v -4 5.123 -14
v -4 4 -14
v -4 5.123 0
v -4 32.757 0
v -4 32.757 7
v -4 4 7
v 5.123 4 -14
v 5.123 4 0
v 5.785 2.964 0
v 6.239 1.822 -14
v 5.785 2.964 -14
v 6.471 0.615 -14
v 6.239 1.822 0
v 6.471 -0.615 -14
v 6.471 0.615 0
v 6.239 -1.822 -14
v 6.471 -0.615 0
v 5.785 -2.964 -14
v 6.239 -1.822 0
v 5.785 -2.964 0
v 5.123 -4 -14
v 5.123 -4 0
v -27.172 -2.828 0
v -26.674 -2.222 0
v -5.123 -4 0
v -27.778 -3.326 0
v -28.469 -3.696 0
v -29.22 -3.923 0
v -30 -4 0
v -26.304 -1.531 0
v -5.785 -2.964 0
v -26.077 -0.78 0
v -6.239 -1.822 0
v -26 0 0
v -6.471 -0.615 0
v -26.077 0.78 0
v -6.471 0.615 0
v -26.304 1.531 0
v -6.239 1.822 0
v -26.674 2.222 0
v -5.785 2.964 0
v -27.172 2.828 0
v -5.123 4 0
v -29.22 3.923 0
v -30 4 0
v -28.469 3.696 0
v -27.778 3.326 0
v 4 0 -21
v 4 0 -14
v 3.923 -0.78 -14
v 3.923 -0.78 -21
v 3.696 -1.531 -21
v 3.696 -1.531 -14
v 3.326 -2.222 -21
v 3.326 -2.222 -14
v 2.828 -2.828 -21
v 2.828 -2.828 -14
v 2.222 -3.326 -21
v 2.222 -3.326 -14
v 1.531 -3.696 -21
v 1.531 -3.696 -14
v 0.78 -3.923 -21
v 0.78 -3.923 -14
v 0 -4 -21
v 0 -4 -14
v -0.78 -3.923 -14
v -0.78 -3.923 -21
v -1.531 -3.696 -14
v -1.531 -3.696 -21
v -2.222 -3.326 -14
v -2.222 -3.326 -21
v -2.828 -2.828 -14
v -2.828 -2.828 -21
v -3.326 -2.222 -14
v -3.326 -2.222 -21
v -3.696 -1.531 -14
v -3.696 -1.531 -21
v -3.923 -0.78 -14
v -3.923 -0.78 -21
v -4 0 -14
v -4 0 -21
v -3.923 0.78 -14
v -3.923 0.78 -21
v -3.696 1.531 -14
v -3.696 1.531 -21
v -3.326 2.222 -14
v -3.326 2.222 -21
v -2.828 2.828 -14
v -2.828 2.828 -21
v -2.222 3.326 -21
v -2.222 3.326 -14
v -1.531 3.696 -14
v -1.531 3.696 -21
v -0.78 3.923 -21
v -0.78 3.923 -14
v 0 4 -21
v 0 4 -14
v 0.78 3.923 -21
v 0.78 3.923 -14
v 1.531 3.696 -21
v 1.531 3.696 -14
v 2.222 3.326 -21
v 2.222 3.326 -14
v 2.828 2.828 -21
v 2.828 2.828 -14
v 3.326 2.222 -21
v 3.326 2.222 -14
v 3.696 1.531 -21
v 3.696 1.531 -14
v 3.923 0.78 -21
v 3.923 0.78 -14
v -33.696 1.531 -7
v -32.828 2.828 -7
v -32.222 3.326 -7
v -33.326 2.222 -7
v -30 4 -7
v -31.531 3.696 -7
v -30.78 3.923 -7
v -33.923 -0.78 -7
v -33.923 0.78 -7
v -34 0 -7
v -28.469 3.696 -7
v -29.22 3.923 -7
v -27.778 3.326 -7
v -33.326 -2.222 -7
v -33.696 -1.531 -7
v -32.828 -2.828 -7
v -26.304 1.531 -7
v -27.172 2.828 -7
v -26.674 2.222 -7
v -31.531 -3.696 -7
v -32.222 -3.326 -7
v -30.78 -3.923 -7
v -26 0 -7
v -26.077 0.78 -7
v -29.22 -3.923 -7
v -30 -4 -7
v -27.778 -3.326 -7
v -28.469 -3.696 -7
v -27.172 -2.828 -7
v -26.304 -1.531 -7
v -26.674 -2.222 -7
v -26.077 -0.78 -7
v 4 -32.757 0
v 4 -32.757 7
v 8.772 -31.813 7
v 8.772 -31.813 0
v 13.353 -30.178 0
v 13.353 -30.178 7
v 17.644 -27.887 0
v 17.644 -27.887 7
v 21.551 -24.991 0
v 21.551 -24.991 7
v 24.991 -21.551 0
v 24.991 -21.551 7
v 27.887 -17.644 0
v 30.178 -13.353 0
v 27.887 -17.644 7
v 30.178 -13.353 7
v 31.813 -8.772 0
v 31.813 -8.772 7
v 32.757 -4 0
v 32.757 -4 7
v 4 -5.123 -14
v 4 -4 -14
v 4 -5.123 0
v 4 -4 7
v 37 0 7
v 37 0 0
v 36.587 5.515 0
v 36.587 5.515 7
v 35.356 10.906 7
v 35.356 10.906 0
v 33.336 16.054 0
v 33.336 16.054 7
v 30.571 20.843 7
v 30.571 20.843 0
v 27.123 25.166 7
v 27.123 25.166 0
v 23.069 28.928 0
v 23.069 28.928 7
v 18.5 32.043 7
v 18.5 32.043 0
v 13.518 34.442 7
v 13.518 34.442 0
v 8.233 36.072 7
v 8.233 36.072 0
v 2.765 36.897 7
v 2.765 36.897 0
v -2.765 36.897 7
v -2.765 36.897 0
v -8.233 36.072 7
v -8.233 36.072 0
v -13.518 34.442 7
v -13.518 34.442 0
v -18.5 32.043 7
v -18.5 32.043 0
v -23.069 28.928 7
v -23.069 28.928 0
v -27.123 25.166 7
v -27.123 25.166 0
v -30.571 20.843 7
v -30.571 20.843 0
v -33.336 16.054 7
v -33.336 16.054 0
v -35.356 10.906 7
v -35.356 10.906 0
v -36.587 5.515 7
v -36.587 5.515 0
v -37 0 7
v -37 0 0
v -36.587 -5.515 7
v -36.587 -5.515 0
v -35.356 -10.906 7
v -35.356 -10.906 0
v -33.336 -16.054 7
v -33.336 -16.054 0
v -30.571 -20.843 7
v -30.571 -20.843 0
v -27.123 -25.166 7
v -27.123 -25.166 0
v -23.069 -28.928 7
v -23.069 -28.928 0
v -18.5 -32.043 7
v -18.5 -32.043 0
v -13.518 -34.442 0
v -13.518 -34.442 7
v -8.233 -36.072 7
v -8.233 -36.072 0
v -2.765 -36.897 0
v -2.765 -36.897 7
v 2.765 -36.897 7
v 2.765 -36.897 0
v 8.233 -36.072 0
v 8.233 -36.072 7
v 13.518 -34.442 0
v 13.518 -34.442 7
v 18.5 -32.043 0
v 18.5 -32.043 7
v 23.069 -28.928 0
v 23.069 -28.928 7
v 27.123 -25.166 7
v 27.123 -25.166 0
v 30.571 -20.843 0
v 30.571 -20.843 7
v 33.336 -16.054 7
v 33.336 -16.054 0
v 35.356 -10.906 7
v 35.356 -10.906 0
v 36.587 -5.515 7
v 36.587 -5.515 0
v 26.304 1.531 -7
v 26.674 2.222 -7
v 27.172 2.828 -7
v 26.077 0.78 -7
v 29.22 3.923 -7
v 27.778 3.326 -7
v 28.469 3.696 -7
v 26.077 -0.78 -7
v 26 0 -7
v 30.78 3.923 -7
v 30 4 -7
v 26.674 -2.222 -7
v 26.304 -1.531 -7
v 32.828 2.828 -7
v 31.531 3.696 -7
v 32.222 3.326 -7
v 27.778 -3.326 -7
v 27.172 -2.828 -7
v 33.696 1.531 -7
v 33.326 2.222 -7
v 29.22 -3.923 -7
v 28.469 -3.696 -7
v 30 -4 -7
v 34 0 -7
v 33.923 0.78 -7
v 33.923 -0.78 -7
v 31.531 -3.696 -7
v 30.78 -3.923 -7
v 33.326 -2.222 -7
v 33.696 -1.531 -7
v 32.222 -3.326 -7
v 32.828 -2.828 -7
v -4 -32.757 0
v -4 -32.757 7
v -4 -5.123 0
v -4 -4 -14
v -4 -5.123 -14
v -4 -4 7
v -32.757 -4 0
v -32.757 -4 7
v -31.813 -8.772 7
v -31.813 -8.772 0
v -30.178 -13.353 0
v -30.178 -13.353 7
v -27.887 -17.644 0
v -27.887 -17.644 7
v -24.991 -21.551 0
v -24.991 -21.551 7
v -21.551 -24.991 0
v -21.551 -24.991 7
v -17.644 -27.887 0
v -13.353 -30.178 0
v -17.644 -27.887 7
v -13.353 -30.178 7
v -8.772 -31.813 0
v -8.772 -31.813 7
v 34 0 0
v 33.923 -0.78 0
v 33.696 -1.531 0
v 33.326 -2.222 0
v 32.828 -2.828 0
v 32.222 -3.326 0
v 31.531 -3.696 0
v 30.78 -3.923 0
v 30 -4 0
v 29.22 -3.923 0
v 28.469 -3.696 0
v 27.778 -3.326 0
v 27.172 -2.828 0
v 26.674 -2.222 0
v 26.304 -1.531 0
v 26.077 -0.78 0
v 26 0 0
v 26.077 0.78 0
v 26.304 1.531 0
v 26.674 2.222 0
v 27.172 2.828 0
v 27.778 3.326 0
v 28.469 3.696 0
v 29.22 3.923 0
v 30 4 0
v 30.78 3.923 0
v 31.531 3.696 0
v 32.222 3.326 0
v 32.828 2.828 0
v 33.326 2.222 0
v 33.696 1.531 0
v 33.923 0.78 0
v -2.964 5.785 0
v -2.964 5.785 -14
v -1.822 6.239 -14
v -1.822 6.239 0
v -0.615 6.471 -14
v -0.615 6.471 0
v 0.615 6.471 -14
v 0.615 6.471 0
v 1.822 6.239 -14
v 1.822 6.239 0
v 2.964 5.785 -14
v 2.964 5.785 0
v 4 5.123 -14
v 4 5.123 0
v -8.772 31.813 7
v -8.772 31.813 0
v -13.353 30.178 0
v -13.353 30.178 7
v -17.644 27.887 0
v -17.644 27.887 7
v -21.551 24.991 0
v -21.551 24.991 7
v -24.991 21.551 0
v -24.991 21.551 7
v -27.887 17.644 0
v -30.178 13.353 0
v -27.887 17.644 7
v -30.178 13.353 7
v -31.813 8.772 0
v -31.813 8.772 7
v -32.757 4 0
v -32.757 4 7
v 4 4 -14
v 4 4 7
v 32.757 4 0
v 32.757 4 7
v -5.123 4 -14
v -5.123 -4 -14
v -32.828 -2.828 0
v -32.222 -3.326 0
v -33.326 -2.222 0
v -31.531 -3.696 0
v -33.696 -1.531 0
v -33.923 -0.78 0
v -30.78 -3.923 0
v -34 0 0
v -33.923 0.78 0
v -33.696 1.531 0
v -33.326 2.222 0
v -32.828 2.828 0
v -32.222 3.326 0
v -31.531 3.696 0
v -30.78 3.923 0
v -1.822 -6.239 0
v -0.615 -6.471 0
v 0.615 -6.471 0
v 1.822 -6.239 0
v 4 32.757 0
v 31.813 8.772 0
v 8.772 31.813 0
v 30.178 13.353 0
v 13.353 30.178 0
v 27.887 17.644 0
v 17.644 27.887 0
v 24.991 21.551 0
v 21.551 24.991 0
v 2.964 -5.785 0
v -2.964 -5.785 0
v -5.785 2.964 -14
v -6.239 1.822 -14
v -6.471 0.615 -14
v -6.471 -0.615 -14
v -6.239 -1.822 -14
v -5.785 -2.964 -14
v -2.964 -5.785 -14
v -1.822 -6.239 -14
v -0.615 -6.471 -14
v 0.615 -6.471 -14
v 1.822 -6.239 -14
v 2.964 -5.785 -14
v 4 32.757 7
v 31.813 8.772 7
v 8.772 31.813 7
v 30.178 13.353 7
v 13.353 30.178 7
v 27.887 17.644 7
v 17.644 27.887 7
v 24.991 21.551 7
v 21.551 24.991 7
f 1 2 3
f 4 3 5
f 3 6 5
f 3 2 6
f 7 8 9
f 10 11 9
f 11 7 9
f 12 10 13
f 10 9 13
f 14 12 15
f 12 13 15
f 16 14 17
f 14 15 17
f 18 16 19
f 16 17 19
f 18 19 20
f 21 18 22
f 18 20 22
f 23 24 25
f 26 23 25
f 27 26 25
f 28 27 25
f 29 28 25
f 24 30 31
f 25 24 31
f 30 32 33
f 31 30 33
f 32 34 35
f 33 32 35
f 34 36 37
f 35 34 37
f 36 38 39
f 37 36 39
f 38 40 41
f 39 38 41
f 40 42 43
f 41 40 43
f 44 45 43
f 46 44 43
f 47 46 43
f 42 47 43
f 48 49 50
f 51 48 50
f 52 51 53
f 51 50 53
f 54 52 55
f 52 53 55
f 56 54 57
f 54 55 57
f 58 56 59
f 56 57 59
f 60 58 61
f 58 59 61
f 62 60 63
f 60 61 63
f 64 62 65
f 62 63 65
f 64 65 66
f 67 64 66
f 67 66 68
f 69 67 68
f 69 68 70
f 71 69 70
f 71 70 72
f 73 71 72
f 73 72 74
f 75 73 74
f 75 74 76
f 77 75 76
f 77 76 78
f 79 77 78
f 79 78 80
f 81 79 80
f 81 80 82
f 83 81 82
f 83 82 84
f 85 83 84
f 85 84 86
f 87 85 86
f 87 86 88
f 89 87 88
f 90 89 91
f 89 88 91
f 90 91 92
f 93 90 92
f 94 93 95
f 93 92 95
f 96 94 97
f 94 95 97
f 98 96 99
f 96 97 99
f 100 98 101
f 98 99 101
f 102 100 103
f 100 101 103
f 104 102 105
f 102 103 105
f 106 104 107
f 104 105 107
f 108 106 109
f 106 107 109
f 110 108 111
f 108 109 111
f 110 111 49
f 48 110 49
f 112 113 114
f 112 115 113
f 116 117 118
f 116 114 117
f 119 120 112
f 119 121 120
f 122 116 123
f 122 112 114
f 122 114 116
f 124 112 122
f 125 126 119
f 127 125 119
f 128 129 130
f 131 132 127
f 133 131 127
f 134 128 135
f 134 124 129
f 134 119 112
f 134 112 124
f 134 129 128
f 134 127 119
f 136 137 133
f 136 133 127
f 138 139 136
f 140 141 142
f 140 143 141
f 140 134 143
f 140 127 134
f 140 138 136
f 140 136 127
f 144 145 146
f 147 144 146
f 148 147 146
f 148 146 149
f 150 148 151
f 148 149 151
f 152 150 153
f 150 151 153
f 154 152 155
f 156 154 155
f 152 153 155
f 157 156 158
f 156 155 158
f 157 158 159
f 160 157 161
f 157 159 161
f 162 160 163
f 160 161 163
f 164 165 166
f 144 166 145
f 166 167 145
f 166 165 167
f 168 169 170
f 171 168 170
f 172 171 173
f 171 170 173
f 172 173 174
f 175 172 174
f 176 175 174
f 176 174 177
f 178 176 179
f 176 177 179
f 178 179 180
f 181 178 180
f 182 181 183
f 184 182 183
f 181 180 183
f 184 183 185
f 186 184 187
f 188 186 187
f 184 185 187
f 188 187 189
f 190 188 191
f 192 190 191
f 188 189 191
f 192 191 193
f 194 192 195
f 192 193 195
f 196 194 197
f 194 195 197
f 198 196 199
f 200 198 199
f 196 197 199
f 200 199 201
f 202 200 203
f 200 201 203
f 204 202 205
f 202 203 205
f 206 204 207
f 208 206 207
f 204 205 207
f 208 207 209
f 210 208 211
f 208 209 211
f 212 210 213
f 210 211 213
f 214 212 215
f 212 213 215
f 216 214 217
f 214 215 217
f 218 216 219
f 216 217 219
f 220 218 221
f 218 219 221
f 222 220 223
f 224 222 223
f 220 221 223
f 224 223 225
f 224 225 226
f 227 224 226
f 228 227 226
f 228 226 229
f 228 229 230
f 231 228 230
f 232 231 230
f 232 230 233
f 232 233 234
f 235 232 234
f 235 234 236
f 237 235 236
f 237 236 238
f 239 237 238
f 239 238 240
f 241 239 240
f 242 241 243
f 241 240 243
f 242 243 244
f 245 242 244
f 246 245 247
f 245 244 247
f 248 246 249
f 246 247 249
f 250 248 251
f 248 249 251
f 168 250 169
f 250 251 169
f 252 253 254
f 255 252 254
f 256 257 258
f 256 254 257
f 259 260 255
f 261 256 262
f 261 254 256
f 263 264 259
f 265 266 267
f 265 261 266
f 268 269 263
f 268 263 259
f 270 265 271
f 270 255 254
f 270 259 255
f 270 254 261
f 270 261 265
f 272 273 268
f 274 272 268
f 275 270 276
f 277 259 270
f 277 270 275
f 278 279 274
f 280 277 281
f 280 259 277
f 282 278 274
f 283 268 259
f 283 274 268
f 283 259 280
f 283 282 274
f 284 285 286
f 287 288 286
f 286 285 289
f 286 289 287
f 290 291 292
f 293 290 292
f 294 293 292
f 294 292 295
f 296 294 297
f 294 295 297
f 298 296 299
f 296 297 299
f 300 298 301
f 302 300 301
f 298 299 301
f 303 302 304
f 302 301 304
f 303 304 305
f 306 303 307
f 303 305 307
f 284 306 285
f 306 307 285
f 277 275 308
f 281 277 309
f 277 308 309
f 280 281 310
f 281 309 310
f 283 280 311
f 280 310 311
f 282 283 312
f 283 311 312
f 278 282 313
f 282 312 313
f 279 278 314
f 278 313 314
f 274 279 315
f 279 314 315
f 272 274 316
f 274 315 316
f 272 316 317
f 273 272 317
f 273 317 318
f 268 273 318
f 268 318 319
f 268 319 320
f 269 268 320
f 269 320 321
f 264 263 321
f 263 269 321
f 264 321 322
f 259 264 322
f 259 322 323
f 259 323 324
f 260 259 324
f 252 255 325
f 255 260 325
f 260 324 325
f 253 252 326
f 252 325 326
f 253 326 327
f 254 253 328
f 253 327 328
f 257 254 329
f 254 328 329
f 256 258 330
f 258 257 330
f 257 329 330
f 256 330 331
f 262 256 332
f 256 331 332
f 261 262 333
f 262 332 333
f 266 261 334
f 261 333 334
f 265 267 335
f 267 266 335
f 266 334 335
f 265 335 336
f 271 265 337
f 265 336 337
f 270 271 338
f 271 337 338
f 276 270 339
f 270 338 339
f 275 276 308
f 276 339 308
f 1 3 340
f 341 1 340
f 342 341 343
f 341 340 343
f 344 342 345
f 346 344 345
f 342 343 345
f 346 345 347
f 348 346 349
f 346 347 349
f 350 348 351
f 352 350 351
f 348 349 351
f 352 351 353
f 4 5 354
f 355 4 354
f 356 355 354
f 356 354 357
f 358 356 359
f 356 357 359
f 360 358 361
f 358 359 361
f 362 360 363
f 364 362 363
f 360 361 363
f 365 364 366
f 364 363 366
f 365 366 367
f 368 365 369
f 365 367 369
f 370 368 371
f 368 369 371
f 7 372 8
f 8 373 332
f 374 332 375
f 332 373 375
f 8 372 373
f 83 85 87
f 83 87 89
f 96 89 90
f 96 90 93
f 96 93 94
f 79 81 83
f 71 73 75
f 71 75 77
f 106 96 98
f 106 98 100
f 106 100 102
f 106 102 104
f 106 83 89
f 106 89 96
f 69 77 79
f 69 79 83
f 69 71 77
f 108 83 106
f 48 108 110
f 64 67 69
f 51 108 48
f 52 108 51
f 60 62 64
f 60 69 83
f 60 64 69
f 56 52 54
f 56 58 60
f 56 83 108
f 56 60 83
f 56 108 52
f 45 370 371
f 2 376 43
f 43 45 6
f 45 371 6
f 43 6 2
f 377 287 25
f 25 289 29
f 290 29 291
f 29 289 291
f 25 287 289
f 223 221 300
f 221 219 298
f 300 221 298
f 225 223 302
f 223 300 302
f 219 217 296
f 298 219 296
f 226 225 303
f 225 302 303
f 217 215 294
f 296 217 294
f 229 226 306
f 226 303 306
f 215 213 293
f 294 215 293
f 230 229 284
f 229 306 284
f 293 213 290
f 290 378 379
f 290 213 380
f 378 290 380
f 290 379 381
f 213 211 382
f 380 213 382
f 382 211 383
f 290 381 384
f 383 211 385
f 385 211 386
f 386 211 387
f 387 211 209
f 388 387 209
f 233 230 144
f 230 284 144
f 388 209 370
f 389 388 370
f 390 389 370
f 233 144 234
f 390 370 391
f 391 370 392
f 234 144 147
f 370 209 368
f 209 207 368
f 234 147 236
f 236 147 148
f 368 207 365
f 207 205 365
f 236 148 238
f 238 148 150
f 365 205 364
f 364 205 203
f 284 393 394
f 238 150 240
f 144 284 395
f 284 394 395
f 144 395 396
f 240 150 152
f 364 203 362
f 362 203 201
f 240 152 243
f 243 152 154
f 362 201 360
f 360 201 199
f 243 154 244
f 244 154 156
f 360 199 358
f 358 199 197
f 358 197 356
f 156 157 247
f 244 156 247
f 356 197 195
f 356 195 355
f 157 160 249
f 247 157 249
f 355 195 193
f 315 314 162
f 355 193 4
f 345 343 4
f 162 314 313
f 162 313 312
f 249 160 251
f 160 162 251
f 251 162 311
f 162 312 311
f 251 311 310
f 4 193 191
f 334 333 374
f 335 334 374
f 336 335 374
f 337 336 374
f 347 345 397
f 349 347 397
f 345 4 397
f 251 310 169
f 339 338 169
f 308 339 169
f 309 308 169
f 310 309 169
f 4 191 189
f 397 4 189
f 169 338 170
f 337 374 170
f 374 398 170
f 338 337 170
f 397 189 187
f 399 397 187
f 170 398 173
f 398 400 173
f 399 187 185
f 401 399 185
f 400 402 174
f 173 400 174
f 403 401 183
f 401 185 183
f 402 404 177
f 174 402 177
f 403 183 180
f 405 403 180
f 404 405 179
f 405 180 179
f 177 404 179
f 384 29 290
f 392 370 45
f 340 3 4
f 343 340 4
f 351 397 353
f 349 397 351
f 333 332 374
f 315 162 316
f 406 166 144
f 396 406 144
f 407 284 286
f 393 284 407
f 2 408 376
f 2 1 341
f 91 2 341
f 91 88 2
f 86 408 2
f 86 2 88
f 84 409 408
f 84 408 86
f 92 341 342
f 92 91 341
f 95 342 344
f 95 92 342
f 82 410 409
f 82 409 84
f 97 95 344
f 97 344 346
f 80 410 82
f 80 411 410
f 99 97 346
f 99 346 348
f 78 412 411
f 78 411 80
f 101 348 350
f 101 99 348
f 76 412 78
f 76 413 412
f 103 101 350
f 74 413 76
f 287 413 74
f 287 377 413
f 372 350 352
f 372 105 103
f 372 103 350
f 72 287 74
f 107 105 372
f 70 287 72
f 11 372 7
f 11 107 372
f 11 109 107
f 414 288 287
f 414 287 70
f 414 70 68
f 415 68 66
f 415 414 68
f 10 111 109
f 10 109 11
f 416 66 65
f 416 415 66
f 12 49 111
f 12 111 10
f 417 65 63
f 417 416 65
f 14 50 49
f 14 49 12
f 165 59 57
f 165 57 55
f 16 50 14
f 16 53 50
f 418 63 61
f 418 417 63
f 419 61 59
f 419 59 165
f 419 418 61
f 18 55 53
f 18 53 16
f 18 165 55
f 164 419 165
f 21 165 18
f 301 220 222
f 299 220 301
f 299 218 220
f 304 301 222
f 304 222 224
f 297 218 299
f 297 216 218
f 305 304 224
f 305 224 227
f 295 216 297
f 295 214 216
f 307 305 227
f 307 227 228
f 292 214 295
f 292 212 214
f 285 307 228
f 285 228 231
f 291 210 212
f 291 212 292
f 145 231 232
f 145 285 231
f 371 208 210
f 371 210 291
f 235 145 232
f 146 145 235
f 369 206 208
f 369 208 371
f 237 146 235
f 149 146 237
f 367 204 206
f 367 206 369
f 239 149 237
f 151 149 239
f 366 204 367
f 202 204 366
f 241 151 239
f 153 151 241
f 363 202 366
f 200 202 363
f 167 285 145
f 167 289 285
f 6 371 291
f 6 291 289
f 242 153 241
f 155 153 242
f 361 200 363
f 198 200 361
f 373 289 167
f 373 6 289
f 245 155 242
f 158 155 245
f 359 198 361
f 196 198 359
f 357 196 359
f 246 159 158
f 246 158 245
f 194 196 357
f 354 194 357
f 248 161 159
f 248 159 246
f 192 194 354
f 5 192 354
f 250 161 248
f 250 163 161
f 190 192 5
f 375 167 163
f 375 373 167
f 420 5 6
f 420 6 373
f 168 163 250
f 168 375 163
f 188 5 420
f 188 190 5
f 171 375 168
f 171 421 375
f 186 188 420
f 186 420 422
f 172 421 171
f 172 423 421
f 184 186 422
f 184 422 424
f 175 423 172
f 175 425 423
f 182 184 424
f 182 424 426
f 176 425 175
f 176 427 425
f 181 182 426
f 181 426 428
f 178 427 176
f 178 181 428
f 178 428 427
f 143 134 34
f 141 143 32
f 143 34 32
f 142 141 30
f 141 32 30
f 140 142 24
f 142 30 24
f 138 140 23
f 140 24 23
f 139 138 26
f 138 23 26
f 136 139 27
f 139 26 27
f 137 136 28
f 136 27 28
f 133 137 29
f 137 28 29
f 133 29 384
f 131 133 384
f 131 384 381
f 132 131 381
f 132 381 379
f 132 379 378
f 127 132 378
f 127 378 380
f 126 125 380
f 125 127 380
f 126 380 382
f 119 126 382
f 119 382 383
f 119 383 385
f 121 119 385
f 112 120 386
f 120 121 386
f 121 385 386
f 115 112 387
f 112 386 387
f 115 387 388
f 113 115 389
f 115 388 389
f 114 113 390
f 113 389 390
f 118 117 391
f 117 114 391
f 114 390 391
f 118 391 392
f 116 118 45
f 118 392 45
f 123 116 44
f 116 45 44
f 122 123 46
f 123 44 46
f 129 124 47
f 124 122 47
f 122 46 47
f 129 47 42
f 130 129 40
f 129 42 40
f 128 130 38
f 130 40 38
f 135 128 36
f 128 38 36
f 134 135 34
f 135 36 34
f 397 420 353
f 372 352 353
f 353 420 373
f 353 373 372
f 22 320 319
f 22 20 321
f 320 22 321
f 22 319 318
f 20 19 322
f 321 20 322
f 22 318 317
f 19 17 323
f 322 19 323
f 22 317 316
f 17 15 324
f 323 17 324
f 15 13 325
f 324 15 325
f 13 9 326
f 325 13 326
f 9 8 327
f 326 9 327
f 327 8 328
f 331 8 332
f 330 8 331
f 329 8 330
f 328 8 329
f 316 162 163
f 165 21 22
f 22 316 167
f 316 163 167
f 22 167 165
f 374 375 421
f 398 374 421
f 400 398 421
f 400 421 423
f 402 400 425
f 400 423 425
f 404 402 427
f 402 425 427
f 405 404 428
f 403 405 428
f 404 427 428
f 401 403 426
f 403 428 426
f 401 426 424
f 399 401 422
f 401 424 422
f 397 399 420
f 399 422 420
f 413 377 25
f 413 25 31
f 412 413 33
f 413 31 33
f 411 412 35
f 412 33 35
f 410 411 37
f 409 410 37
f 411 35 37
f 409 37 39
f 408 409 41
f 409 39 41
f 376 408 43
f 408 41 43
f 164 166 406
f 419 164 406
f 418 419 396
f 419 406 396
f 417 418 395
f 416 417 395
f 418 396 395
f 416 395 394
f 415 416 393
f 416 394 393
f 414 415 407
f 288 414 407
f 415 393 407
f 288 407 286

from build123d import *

# Parameters (mm, degrees)
F0_R     = 37
F1_DEPTH = 7
F2_R     = 4
F3_DEPTH = 21
F4_R     = 4
F5_DEPTH = 7
F6_R     = 6.5
F7_DEPTH = 14
F9_DEPTH = 28.001


with BuildPart() as f1:
    # F0 (on Top) → F1 (new body)
    with BuildSketch(Plane.XY):
        Circle(F0_R)
    extrude(amount=F1_DEPTH)

    # F2 (on face) → F3 (join)
    with BuildSketch(Plane(origin=(0, 0, 0), x_dir=(1, 0, 0), z_dir=(0, 0, -1))):
        Circle(F2_R)
    extrude(amount=F3_DEPTH)

    # F4 (on face) → F5 (join)
    with BuildSketch(Plane(origin=(0, 0, 0), x_dir=(1, 0, 0), z_dir=(0, 0, -1))):
        with Locations((-30, 0)):
            Circle(F4_R)
        with Locations((30, 0)):
            Circle(F4_R)
    extrude(amount=F5_DEPTH)

    # F6 (on face) → F7 (join)
    with BuildSketch(Plane(origin=(0, 0, 0), x_dir=(1, 0, 0), z_dir=(0, 0, -1))):
        Circle(F6_R)
    extrude(amount=F7_DEPTH)

    # F8 (on face) → F9 (cut, through all)
    with BuildSketch(Plane.XY.offset(7)):
        with BuildLine():
            Line((-4, -4), (-32.756679, -4))
            ThreePointArc((-32.756679, -4), (-23.334524, -23.334524), (-4, -32.756679))
            Line((-4, -32.756679), (-4, -4))
        make_face()
        with BuildLine():
            Line((-32.756679, 4), (-4, 4))
            Line((-4, 4), (-4, 32.756679))
            ThreePointArc((-4, 32.756679), (-23.334524, 23.334524), (-32.756679, 4))
        make_face()
        with BuildLine():
            Line((4, 4), (32.756679, 4))
            ThreePointArc((32.756679, 4), (23.334524, 23.334524), (4, 32.756679))
            Line((4, 32.756679), (4, 4))
        make_face()
        with BuildLine():
            Line((32.756679, -4), (4, -4))
            Line((4, -4), (4, -32.756679))
            ThreePointArc((4, -32.756679), (23.334524, -23.334524), (32.756679, -4))
        make_face()
    extrude(amount=-F9_DEPTH, mode=Mode.SUBTRACT)


solid = f1.part
